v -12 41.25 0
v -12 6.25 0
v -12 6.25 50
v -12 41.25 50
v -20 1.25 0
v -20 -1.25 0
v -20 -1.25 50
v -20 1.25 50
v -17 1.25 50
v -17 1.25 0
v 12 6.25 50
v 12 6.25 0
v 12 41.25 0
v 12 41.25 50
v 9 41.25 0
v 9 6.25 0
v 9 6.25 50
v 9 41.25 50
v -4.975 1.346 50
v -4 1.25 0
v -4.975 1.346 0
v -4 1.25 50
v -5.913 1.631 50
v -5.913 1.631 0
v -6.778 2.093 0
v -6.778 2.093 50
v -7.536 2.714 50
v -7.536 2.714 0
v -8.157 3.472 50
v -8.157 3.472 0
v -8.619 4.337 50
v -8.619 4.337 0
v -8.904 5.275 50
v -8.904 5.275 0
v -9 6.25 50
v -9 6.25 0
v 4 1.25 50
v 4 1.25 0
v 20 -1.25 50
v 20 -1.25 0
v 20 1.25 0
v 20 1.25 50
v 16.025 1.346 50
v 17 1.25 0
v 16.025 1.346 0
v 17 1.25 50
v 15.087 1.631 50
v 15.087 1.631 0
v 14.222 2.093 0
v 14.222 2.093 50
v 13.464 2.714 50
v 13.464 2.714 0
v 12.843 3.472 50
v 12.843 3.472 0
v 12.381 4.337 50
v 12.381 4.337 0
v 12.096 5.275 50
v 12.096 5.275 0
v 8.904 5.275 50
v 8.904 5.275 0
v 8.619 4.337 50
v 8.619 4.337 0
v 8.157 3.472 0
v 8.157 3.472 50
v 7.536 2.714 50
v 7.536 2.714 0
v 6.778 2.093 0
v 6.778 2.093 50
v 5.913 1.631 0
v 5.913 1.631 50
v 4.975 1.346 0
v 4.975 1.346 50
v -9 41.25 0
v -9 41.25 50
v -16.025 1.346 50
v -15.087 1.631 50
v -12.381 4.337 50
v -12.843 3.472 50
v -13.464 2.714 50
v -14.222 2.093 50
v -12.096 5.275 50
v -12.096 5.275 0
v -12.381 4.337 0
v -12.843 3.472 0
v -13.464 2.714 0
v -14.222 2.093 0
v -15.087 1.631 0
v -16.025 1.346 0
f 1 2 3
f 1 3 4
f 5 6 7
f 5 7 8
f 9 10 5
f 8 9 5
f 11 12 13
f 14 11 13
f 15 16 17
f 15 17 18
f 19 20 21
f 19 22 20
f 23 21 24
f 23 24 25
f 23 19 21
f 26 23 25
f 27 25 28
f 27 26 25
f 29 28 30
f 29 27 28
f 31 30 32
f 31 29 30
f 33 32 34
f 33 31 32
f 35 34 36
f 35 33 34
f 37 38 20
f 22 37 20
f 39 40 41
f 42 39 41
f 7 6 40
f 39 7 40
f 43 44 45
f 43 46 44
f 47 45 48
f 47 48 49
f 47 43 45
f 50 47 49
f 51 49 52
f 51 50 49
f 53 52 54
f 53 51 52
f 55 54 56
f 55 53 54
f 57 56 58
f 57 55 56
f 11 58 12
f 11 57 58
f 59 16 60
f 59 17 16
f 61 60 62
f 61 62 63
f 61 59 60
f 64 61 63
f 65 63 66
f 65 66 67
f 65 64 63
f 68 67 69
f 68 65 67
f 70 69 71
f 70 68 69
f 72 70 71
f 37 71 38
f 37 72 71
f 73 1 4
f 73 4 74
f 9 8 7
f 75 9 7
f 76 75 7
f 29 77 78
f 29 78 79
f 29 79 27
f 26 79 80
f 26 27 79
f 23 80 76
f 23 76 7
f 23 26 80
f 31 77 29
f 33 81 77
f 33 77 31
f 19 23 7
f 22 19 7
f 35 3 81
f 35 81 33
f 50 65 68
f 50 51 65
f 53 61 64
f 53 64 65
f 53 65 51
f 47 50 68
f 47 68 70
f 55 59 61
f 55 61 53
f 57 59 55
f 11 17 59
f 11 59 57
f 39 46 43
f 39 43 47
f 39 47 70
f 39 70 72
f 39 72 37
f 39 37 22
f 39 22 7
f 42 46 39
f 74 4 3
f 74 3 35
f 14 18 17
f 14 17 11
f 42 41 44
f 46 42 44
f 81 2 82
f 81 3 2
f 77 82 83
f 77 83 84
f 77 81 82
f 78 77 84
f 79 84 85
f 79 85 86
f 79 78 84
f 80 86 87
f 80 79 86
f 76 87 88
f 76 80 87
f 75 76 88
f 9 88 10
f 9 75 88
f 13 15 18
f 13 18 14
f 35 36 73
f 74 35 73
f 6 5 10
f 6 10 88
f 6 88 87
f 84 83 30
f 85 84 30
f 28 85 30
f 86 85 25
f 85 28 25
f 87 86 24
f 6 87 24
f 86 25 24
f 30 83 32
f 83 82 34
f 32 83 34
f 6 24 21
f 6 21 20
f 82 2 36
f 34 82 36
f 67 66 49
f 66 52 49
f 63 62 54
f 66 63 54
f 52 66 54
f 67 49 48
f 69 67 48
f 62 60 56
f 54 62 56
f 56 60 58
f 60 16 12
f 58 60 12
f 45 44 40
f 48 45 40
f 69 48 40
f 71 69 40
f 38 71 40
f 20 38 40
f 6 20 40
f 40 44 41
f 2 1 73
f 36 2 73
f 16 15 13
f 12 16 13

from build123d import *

# Parameters (mm, degrees)
F0_W     = 8
F0_H     = 2.5
F0_W_2   = 3
F0_H_2   = 40
F1_DEPTH = 50
F2_R     = 5


with BuildPart() as f1:
    # F0 (on Top) → F1 (new body)
    with BuildSketch(Plane.XY):
        with Locations((16, 0)):
            Rectangle(F0_W, F0_H)
        Polygon((-12, 1.25), (-12, -1.25), (12, -1.25), (12, 1.25), (9, 1.25), (-9, 1.25), align=None)
        with Locations((-16, 0)):
            Rectangle(F0_W, F0_H)
        with Locations((10.5, 21.25)):
            Rectangle(F0_W_2, F0_H_2)
        with Locations((-10.5, 21.25)):
            Rectangle(F0_W_2, F0_H_2)
    extrude(amount=F1_DEPTH)

    # F2
    f2_edges = [f1.edges().sort_by_distance(p)[0] for p in [
        (12, 1.25, 25),
        (-12, 1.25, 25),
        (-9, 1.25, 25),
        (9, 1.25, 25),
    ]]
    fillet(f2_edges, radius=F2_R)


solid = f1.part
